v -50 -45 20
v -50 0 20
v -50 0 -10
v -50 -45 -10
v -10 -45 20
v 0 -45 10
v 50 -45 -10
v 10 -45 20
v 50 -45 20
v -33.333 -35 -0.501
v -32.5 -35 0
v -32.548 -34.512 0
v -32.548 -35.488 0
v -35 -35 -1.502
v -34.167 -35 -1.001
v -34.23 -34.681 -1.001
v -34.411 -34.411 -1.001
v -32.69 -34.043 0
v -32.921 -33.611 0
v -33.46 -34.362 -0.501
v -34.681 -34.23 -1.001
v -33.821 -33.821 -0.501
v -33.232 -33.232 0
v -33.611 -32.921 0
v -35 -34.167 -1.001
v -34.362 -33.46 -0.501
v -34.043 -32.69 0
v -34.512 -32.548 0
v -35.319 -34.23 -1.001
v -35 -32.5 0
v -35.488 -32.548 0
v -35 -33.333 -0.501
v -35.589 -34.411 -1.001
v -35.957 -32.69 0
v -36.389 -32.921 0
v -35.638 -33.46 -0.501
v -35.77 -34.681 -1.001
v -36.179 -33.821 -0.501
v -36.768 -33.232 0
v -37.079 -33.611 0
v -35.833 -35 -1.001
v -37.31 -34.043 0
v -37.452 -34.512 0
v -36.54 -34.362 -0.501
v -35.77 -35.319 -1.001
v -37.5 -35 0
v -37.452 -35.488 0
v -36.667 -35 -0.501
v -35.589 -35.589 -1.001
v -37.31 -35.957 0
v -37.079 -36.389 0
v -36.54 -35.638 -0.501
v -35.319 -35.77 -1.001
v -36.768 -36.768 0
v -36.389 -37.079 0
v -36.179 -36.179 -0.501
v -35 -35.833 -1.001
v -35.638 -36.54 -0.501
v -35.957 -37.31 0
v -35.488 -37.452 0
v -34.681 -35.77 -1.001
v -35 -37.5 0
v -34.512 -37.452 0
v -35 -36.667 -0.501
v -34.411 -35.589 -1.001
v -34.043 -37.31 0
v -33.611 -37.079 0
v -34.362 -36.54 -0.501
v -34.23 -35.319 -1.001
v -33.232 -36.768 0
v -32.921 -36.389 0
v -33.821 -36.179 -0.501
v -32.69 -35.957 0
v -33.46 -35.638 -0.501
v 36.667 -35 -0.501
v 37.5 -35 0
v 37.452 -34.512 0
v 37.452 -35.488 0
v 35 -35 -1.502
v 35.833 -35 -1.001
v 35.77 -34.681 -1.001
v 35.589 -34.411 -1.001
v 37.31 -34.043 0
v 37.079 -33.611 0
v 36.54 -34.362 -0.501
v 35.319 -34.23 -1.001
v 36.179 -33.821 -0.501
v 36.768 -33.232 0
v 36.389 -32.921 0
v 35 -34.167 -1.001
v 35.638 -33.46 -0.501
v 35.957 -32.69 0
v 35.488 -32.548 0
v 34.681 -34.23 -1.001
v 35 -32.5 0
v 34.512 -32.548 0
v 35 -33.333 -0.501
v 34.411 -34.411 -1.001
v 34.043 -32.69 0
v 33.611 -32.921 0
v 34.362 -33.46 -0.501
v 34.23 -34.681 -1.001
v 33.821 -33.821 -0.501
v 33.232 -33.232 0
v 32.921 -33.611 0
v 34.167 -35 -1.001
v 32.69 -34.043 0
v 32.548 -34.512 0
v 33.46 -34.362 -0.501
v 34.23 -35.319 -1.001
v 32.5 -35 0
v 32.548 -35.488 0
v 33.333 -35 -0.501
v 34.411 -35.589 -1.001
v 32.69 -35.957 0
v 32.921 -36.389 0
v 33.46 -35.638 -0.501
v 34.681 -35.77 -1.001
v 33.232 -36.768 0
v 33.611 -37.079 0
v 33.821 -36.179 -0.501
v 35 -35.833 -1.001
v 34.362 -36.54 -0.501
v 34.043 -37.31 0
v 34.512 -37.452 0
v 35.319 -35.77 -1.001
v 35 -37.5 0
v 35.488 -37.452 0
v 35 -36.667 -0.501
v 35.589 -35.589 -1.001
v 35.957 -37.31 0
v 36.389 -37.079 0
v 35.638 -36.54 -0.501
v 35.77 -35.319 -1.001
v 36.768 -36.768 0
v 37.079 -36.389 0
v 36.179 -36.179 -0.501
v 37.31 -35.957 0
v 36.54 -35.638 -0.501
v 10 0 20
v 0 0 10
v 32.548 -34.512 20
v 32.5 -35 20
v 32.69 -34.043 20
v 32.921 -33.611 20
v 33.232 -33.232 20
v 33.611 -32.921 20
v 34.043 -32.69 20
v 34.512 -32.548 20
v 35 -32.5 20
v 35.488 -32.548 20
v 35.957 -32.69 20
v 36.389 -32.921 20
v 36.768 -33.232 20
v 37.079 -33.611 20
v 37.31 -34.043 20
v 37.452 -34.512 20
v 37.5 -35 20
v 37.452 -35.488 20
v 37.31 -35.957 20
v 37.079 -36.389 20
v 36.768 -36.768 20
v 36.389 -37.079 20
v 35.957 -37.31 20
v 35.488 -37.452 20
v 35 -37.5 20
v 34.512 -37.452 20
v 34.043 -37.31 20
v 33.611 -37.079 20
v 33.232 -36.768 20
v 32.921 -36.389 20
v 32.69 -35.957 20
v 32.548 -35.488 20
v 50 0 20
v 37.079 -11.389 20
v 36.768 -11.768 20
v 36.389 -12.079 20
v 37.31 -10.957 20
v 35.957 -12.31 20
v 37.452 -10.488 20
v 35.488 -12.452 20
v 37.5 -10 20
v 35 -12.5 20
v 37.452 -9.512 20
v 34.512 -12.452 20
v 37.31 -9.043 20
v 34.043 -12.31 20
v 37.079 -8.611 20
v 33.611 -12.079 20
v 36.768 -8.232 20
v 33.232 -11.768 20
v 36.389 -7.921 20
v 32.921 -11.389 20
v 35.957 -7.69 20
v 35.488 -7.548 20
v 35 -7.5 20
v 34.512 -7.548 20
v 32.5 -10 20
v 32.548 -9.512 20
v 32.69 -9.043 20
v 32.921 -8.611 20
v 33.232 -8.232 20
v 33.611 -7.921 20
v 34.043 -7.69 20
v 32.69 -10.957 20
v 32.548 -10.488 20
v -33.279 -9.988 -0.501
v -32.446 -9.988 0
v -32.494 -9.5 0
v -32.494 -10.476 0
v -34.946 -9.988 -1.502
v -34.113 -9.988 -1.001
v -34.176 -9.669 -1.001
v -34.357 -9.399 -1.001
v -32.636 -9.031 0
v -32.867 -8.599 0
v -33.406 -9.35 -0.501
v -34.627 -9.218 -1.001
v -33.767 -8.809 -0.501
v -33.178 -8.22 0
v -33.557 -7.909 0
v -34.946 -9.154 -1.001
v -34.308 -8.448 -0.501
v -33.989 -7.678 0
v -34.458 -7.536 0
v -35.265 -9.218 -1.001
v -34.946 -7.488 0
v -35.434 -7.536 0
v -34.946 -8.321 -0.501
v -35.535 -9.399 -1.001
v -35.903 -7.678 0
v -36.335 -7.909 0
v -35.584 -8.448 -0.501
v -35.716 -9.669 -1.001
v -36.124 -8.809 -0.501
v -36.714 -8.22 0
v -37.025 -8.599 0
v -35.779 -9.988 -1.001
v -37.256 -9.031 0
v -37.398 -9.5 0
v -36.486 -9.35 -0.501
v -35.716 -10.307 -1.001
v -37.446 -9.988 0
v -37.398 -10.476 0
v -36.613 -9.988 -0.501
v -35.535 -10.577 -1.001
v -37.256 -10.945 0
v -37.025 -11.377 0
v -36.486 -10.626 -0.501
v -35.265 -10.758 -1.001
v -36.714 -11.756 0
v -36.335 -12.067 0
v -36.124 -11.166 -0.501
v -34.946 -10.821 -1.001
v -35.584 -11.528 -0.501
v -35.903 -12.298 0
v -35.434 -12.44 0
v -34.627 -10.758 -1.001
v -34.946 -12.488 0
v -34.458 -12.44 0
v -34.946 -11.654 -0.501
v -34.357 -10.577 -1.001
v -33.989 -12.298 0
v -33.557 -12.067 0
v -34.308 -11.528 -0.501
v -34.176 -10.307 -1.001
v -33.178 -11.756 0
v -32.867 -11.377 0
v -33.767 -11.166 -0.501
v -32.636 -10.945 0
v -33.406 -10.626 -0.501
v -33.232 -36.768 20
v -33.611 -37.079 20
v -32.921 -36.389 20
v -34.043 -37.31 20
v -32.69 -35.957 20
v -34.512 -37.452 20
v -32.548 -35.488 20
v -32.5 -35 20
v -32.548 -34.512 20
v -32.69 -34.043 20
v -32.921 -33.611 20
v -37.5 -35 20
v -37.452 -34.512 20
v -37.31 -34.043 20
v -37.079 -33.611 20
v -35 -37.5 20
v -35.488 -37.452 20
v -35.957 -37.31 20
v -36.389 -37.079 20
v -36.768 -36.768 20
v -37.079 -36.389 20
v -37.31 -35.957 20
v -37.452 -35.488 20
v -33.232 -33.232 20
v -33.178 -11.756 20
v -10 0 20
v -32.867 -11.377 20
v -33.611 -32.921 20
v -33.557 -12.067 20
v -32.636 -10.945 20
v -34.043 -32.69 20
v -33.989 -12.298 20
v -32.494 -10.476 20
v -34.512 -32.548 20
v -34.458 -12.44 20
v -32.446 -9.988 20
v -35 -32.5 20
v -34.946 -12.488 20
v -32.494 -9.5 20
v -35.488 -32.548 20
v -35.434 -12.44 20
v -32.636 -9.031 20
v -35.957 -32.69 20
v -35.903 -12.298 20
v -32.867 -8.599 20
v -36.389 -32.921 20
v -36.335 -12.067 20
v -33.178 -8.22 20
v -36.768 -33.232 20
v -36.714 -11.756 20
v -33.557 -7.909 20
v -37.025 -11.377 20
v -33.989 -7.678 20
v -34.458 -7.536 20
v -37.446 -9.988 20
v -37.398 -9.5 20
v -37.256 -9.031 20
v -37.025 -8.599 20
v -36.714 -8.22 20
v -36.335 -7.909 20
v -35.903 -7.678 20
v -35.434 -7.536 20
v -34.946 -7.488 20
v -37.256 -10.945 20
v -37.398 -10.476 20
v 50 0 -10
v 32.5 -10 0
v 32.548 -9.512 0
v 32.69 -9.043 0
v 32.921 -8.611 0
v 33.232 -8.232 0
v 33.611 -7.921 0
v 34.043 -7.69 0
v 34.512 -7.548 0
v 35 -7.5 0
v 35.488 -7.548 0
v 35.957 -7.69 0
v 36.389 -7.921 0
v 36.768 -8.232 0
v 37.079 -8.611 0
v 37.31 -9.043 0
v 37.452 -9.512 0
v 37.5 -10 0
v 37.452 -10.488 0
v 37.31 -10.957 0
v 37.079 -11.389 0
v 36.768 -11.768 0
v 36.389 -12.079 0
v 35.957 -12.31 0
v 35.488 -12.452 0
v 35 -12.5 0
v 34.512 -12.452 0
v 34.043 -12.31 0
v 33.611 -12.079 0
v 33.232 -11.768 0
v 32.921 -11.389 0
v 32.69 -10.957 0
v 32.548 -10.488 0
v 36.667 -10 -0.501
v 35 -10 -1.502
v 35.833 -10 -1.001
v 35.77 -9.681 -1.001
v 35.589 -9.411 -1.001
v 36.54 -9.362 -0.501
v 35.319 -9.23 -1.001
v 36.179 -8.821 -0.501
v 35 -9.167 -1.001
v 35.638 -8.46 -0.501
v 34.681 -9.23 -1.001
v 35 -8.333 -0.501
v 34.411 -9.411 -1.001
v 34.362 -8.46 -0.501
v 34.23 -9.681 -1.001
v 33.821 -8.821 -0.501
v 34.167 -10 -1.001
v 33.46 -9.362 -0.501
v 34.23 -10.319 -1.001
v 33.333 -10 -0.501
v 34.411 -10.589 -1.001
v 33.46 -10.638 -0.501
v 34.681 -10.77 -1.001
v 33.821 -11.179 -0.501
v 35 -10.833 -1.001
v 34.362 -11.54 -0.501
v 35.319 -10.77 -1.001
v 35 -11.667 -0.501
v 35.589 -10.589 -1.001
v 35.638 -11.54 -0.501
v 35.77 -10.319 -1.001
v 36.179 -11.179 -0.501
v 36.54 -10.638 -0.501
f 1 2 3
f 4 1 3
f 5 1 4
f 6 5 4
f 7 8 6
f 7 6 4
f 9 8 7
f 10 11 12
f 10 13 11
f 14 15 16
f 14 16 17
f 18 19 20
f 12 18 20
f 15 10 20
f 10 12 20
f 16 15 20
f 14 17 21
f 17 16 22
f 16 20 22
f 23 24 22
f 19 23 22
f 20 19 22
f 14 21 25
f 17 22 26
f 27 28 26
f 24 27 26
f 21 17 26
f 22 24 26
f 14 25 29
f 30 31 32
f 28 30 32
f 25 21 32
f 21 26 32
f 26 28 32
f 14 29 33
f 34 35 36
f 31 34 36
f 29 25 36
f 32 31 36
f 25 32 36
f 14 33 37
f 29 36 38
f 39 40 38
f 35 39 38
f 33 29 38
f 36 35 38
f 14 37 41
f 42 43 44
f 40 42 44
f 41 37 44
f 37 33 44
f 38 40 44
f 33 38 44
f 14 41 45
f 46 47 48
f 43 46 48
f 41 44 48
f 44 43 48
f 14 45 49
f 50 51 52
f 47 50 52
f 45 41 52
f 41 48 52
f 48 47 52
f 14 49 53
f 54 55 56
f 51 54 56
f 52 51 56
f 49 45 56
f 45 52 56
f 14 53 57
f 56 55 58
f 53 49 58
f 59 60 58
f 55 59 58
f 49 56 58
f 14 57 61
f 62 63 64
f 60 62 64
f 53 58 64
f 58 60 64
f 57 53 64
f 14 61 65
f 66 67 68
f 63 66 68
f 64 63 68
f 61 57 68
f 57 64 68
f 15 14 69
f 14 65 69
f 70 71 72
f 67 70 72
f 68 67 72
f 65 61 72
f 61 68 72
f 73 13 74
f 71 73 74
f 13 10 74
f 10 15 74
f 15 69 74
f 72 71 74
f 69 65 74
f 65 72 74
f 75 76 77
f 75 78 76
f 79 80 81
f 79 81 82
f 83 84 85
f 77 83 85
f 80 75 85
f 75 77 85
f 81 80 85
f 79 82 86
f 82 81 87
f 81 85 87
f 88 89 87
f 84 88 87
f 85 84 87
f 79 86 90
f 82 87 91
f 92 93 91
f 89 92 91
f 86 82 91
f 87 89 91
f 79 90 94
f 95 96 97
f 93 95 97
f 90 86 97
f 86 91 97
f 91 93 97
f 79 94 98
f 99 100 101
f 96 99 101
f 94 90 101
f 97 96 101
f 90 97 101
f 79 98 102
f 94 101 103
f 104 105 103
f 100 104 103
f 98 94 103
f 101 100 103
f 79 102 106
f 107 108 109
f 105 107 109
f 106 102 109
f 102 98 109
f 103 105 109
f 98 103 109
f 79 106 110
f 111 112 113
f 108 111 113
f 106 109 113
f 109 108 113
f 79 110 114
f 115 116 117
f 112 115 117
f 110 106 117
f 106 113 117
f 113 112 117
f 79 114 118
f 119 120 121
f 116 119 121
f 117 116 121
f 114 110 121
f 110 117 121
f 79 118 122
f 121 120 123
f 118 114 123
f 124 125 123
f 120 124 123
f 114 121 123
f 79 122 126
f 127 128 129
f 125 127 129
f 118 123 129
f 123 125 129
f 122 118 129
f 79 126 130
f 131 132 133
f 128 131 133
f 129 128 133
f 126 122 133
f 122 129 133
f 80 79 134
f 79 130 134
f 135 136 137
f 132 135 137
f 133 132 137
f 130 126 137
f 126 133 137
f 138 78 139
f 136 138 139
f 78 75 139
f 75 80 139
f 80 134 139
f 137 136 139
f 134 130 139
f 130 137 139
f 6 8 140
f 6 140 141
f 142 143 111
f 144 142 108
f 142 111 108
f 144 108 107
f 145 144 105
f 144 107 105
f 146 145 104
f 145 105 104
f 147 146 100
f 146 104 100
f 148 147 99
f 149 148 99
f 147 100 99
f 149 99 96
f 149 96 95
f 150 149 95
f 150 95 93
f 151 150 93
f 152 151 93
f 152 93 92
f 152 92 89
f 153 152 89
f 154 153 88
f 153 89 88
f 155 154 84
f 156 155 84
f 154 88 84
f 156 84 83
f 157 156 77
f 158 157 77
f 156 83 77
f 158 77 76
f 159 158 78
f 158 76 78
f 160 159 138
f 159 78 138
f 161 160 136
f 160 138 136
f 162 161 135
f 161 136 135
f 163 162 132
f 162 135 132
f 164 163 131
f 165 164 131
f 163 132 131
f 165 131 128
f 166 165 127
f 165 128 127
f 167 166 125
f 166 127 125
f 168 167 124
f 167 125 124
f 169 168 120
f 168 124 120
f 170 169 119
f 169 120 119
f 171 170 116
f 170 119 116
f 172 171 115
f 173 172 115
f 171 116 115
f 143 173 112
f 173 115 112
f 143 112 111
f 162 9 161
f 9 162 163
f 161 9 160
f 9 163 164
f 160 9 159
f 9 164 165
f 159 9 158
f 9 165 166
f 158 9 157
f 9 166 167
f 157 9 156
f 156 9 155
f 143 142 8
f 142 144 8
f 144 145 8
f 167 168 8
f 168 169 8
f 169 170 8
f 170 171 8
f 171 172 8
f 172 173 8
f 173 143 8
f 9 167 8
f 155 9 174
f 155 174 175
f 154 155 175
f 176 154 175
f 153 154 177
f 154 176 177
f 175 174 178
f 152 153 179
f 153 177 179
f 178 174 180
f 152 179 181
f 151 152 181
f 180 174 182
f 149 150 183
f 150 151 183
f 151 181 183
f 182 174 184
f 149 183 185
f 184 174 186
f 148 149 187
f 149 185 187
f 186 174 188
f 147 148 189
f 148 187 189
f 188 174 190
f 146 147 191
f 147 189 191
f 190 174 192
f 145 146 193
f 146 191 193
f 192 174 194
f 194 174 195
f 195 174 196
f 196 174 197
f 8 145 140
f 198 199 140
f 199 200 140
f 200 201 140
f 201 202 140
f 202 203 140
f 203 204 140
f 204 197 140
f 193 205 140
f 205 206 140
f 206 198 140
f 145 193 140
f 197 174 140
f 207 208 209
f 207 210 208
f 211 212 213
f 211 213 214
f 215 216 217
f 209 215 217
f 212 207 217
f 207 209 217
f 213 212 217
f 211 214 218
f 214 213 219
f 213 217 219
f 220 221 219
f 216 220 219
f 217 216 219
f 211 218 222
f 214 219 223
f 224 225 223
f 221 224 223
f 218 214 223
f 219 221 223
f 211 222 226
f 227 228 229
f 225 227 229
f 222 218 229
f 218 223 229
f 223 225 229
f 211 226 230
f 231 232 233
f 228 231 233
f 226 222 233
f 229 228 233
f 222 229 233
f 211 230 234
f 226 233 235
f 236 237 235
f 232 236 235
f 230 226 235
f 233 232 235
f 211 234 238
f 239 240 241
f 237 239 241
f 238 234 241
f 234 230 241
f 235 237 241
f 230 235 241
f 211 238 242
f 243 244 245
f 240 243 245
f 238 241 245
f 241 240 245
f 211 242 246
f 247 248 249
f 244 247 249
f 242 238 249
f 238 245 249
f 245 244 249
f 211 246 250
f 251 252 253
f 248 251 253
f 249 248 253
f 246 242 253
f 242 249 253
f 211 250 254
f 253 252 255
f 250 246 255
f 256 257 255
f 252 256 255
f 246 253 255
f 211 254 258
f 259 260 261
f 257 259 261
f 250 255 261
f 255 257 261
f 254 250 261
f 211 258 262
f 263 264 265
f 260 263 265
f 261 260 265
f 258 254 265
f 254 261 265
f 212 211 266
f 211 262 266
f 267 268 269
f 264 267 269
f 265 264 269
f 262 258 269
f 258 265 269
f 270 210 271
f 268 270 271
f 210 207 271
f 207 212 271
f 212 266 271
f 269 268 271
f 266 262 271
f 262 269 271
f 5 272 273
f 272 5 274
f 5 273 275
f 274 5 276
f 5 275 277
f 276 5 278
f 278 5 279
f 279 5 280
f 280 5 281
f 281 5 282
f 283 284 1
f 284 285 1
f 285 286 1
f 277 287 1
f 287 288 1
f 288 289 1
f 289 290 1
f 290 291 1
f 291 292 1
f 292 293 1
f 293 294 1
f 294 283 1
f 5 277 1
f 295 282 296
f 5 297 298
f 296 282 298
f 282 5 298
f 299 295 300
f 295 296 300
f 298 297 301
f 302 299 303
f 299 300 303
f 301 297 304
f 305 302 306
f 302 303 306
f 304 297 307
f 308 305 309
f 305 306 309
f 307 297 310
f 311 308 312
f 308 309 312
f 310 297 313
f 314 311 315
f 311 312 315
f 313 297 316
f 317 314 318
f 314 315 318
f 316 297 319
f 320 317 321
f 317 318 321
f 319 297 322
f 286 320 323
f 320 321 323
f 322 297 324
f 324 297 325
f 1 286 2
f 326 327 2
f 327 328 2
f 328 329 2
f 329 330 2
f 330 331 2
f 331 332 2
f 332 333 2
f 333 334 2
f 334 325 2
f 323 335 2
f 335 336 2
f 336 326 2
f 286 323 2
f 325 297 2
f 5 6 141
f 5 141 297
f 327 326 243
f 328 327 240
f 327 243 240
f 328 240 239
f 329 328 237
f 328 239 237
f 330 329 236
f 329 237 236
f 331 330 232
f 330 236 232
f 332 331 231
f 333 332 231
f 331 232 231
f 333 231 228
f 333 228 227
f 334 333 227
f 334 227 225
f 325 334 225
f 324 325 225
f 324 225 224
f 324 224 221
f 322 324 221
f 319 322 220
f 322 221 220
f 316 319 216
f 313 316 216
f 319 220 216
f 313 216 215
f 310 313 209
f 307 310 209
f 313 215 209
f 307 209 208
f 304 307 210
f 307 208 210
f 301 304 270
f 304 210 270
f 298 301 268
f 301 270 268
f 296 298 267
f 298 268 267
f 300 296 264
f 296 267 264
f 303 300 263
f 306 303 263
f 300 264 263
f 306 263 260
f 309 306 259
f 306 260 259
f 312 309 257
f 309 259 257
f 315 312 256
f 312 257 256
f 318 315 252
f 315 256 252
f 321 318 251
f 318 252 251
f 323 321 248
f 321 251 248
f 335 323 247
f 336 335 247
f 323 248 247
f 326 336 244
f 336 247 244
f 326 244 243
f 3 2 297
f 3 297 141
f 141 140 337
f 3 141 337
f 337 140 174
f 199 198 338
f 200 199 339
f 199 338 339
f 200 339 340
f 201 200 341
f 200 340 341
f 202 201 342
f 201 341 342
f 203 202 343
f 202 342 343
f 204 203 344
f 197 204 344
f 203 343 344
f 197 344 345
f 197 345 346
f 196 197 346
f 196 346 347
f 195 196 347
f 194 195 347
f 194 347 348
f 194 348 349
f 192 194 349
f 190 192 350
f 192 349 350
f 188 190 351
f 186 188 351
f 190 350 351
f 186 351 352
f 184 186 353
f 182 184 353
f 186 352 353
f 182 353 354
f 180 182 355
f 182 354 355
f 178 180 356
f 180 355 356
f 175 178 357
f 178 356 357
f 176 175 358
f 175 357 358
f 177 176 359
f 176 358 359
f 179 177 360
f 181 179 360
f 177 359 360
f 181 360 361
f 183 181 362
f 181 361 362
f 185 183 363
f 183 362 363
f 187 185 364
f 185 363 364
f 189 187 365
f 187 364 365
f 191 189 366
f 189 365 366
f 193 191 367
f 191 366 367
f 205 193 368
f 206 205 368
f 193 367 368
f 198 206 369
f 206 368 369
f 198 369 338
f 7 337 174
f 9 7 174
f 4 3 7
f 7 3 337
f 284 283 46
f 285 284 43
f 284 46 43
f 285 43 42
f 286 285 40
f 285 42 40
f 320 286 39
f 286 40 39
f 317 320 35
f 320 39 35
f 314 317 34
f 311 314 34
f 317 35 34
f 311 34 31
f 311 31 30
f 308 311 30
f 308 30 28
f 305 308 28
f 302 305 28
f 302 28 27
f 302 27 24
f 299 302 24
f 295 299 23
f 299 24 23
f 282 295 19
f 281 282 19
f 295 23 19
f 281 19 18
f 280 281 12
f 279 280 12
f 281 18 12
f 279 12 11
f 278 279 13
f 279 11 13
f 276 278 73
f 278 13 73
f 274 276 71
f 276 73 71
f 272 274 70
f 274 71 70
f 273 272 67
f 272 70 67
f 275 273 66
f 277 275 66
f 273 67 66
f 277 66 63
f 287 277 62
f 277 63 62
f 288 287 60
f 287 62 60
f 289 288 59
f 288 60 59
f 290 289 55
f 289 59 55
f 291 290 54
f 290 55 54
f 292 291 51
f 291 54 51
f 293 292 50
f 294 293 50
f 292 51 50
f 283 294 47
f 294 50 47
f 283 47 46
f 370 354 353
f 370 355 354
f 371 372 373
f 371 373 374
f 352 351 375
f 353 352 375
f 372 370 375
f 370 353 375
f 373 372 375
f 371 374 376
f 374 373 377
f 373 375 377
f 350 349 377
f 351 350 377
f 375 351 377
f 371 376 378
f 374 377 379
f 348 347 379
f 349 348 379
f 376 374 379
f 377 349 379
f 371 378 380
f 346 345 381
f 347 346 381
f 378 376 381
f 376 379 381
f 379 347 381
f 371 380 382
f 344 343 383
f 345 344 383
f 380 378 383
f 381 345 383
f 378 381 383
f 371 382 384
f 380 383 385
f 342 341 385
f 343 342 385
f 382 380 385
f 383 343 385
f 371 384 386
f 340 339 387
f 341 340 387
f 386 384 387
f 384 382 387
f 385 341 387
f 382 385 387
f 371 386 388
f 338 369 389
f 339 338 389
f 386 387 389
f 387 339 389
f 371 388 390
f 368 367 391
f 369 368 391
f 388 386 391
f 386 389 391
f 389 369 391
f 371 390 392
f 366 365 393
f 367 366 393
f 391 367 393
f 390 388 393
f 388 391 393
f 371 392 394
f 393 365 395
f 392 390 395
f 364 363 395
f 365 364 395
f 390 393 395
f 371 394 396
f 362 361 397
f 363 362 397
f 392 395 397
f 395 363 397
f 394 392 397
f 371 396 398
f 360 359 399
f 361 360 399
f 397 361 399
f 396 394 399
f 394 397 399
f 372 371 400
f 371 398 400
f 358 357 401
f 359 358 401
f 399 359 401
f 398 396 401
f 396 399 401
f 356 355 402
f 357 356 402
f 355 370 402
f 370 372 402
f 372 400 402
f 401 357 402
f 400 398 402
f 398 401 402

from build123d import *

# Parameters (mm, degrees)
F1_DEPTH  = 45
F3_D      = 5
F3_DEPTH  = 20
F3_TIP    = 1.5021515476
F5_D      = 5
F5_DEPTH  = 20
F5_TIP    = 1.5021515476
F8_D      = 5
F8_DEPTH  = 20
F8_TIP    = 1.5021515476
F10_D     = 5
F10_DEPTH = 20
F10_TIP   = 1.5021515476


with BuildPart() as f1:
    # F0 (on Front) → F1 (new body)
    with BuildSketch(Plane.XZ):
        Polygon((50, 20), (20, 20), (10, 20), (0, 10), (-10, 20), (-20, 20), (-50, 20), (-50, 0), (-50, -10), (50, -10), (50, 0), align=None)
    extrude(amount=F1_DEPTH)

    # F3
    with Locations(Plane.XY.offset(20)):
        with Locations((35, -35)):
            Hole(F3_D / 2, depth=F3_DEPTH)
            with Locations((0, 0, -(F3_DEPTH + F3_TIP / 2))):  # 118° drill point
                Cone(0, F3_D / 2, F3_TIP, mode=Mode.SUBTRACT)

    # F5
    with Locations(Plane.XY.offset(20)):
        with Locations((35, -10)):
            Hole(F5_D / 2, depth=F5_DEPTH)
            with Locations((0, 0, -(F5_DEPTH + F5_TIP / 2))):  # 118° drill point
                Cone(0, F5_D / 2, F5_TIP, mode=Mode.SUBTRACT)

    # F8
    with Locations(Plane.XY.offset(20)):
        with Locations((-35, -35)):
            Hole(F8_D / 2, depth=F8_DEPTH)
            with Locations((0, 0, -(F8_DEPTH + F8_TIP / 2))):  # 118° drill point
                Cone(0, F8_D / 2, F8_TIP, mode=Mode.SUBTRACT)

    # F10
    with Locations(Plane.XY.offset(20)):
        with Locations((-34.9459722638, -9.987832047)):
            Hole(F10_D / 2, depth=F10_DEPTH)
            with Locations((0, 0, -(F10_DEPTH + F10_TIP / 2))):  # 118° drill point
                Cone(0, F10_D / 2, F10_TIP, mode=Mode.SUBTRACT)


solid = f1.part
